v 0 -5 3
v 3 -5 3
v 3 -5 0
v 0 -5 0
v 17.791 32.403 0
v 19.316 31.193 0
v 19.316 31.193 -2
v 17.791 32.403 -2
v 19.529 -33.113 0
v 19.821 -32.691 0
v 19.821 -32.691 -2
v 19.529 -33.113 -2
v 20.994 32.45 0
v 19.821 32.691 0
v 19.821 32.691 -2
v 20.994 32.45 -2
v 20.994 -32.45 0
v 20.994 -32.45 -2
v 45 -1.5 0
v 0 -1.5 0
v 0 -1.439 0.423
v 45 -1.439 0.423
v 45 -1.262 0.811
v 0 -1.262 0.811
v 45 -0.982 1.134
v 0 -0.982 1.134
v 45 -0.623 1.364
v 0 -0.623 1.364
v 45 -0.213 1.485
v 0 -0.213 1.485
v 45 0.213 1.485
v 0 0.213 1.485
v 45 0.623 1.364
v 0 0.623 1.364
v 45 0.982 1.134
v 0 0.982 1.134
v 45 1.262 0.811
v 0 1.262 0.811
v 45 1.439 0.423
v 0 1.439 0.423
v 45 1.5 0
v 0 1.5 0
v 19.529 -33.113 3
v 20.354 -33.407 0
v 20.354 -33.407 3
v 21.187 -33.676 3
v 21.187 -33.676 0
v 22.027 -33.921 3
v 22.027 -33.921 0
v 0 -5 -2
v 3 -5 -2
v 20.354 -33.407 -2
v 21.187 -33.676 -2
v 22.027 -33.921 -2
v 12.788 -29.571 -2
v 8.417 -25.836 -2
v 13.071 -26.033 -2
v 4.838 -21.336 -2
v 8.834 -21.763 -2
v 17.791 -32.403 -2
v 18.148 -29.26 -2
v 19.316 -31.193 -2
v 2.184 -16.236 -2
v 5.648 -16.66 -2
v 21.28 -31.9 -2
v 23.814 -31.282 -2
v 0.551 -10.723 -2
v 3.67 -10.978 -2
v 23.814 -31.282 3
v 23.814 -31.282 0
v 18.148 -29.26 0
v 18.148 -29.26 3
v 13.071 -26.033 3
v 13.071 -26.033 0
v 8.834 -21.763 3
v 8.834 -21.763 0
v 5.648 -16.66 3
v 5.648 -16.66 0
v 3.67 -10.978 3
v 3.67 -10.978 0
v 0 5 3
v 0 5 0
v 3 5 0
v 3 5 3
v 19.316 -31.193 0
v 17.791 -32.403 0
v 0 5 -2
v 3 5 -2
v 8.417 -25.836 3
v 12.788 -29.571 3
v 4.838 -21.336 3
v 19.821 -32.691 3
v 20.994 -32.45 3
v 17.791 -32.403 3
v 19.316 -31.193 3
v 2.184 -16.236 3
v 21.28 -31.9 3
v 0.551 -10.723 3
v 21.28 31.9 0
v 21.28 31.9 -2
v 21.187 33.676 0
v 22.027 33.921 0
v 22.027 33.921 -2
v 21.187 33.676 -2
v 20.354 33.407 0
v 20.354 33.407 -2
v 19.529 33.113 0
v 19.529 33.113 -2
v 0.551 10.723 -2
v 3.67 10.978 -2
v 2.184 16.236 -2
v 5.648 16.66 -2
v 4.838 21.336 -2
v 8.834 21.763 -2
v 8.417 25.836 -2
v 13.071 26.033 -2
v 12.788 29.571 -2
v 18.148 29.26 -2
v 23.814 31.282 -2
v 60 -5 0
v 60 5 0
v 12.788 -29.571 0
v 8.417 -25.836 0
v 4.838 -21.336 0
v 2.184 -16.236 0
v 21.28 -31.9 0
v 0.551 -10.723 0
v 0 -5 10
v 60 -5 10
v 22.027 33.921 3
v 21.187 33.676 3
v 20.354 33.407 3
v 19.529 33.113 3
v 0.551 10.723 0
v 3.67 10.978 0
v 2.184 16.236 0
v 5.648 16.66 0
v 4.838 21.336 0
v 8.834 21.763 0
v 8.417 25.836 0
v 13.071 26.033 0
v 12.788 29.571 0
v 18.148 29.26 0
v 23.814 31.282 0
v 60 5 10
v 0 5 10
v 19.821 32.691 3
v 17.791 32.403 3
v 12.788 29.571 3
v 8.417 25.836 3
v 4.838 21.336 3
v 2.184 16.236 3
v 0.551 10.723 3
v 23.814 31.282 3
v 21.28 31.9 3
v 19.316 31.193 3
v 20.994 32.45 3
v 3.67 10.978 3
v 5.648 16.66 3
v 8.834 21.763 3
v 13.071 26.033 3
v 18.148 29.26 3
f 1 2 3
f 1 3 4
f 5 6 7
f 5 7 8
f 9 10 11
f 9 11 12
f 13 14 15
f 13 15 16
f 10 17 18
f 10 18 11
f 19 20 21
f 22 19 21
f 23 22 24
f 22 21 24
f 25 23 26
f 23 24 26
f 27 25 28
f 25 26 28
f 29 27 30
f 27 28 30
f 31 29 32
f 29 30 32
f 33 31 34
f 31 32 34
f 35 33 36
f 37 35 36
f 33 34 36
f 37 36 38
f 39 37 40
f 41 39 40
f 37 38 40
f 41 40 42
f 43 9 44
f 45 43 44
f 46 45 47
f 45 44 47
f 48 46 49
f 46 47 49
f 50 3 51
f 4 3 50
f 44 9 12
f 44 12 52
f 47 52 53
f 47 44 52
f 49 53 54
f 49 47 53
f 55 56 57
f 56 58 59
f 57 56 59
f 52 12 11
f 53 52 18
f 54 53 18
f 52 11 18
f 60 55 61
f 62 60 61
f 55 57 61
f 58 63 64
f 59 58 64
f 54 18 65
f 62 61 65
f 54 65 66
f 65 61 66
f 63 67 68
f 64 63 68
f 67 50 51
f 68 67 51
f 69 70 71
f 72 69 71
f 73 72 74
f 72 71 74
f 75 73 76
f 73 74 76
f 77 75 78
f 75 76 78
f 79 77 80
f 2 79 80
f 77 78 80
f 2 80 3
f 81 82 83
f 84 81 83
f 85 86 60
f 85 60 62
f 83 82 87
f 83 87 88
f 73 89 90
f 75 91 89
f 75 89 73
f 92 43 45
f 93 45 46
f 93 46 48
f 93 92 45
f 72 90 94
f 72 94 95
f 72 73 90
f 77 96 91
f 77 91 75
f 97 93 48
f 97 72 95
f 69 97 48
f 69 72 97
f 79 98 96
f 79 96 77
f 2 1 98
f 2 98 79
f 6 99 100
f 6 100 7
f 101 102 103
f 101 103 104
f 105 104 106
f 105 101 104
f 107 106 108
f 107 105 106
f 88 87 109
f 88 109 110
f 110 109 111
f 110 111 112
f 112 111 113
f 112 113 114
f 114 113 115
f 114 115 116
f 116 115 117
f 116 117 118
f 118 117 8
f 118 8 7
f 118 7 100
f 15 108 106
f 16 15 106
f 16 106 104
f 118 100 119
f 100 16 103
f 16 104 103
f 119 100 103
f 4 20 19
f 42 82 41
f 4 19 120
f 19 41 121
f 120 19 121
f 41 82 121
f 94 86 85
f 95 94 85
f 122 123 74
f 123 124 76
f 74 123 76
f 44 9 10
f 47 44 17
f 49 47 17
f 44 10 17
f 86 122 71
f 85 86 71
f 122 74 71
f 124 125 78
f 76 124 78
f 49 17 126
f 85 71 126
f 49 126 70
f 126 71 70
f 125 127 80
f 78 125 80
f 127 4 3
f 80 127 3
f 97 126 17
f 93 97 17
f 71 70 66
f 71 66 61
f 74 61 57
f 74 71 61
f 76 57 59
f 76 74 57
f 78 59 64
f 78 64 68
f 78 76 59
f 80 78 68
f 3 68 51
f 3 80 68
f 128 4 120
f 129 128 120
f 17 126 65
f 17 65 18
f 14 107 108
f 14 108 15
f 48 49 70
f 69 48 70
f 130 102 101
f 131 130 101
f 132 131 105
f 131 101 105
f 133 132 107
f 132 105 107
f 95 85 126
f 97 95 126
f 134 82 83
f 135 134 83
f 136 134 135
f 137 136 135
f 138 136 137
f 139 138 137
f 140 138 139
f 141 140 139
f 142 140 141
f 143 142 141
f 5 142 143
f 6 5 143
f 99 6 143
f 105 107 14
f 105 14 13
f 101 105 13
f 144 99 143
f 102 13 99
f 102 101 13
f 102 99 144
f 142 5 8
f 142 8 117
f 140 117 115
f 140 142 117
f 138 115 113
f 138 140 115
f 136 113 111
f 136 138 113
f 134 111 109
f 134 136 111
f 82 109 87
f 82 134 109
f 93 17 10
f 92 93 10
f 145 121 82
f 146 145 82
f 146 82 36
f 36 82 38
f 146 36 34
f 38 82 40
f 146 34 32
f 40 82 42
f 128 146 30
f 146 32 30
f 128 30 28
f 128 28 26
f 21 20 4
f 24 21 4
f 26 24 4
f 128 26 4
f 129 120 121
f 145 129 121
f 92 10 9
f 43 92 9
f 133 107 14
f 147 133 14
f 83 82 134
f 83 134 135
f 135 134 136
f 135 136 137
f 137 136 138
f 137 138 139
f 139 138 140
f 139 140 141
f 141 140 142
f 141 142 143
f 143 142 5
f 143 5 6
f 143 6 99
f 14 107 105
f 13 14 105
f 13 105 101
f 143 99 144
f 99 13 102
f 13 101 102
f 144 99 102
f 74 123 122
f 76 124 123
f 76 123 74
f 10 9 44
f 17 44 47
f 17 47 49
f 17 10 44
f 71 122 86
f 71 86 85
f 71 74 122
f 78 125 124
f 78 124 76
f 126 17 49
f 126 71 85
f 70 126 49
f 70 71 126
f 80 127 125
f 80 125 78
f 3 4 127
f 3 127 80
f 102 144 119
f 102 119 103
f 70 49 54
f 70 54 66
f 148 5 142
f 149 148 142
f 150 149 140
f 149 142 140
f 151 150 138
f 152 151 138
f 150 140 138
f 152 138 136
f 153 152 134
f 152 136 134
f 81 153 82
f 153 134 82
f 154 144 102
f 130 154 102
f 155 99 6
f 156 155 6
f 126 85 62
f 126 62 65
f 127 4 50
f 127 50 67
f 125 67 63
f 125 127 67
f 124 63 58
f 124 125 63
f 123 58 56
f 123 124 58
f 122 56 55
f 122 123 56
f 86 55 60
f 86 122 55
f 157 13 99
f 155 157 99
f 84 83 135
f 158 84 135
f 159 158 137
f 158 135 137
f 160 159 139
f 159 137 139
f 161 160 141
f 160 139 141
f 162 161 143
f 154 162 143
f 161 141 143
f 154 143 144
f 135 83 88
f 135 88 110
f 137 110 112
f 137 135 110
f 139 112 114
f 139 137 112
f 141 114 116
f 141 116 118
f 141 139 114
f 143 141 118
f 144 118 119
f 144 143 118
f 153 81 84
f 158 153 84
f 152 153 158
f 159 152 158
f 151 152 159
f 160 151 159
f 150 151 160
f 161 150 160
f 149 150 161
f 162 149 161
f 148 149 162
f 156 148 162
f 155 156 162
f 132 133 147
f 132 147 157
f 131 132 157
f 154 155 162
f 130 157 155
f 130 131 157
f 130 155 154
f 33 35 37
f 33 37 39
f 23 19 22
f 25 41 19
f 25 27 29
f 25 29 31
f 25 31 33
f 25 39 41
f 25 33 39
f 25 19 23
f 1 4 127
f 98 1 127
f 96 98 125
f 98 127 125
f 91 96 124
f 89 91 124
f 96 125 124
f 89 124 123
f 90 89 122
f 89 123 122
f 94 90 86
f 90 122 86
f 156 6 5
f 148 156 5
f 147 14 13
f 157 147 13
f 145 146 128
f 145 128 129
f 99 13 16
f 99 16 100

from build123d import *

# Parameters (mm, degrees)
F1_DEPTH = 3
F2_DEPTH = 10
F3_DEPTH = 2
F5_DEPTH = 45


with BuildPart() as f1:
    # F0 (on Top) → F1 (new body)
    with BuildSketch(Plane.XY):
        with BuildLine():
            Line((3, -5), (0, -5))
            ThreePointArc((0, -5), (4.837963, -21.336213), (17.791458, -32.403494))
            Line((17.791458, -32.403494), (19.316092, -31.19313))
            Line((19.316092, -31.19313), (21.280371, -31.899896))
            Line((21.280371, -31.899896), (20.994244, -32.450024))
            Line((20.994244, -32.450024), (19.821469, -32.690592))
            Line((19.821469, -32.690592), (19.52909, -33.113343))
            ThreePointArc((19.52909, -33.113343), (20.769204, -33.544569), (22.026998, -33.921121))
            Line((22.026998, -33.921121), (23.814403, -31.281902))
            ThreePointArc((23.814403, -31.281902), (8.833858, -21.762889), (3, -5))
        make_face()
        with BuildLine():
            ThreePointArc((17.791458, 32.403494), (4.837963, 21.336213), (0, 5))
            Line((0, 5), (3, 5))
            ThreePointArc((3, 5), (8.833858, 21.762889), (23.814403, 31.281902))
            Line((23.814403, 31.281902), (22.026998, 33.921121))
            ThreePointArc((22.026998, 33.921121), (20.769204, 33.544569), (19.52909, 33.113343))
            Line((19.52909, 33.113343), (19.821469, 32.690592))
            Line((19.821469, 32.690592), (20.994244, 32.450024))
            Line((20.994244, 32.450024), (21.280371, 31.899896))
            Line((21.280371, 31.899896), (19.316092, 31.19313))
            Line((19.316092, 31.19313), (17.791458, 32.403494))
        make_face()
    extrude(amount=F1_DEPTH)


with BuildPart() as f2:
    # F0 (on Top) → F2 (new body)
    with BuildSketch(Plane.XY):
        Polygon((0, 5), (0, 0), (0, -5), (3, -5), (60, -5), (60, 0), (60, 5), (3, 5), align=None)
    extrude(amount=F2_DEPTH)

    # F4 (on face) → F5 (cut)
    with BuildSketch(Plane(origin=(0, 0, 0), x_dir=(0, -1, 0), z_dir=(-1, 0, 0))):
        with BuildLine():
            ThreePointArc((-1.5, 0), (0, -1.5), (1.5, 0))
            Line((1.5, 0), (-1.5, 0))
        make_face()
        with BuildLine():
            Line((-1.5, 0), (1.5, 0))
            ThreePointArc((1.5, 0), (0, 1.5), (-1.5, 0))
        make_face()
    extrude(amount=-F5_DEPTH, mode=Mode.SUBTRACT)


with BuildPart() as f3:
    # F0 (on Top) → F3 (new body)
    with BuildSketch(Plane.XY):
        with BuildLine():
            ThreePointArc((17.791458, 32.403494), (4.837963, 21.336213), (0, 5))
            Line((0, 5), (3, 5))
            ThreePointArc((3, 5), (8.833858, 21.762889), (23.814403, 31.281902))
            Line((23.814403, 31.281902), (22.026998, 33.921121))
            ThreePointArc((22.026998, 33.921121), (20.769204, 33.544569), (19.52909, 33.113343))
            Line((19.52909, 33.113343), (19.821469, 32.690592))
            Line((19.821469, 32.690592), (20.994244, 32.450024))
            Line((20.994244, 32.450024), (21.280371, 31.899896))
            Line((21.280371, 31.899896), (19.316092, 31.19313))
            Line((19.316092, 31.19313), (17.791458, 32.403494))
        make_face()
        with BuildLine():
            Line((3, -5), (0, -5))
            ThreePointArc((0, -5), (4.837963, -21.336213), (17.791458, -32.403494))
            Line((17.791458, -32.403494), (19.316092, -31.19313))
            Line((19.316092, -31.19313), (21.280371, -31.899896))
            Line((21.280371, -31.899896), (20.994244, -32.450024))
            Line((20.994244, -32.450024), (19.821469, -32.690592))
            Line((19.821469, -32.690592), (19.52909, -33.113343))
            ThreePointArc((19.52909, -33.113343), (20.769204, -33.544569), (22.026998, -33.921121))
            Line((22.026998, -33.921121), (23.814403, -31.281902))
            ThreePointArc((23.814403, -31.281902), (8.833858, -21.762889), (3, -5))
        make_face()
    extrude(amount=-F3_DEPTH)


solid = Compound([f1.part, f2.part, f3.part])
